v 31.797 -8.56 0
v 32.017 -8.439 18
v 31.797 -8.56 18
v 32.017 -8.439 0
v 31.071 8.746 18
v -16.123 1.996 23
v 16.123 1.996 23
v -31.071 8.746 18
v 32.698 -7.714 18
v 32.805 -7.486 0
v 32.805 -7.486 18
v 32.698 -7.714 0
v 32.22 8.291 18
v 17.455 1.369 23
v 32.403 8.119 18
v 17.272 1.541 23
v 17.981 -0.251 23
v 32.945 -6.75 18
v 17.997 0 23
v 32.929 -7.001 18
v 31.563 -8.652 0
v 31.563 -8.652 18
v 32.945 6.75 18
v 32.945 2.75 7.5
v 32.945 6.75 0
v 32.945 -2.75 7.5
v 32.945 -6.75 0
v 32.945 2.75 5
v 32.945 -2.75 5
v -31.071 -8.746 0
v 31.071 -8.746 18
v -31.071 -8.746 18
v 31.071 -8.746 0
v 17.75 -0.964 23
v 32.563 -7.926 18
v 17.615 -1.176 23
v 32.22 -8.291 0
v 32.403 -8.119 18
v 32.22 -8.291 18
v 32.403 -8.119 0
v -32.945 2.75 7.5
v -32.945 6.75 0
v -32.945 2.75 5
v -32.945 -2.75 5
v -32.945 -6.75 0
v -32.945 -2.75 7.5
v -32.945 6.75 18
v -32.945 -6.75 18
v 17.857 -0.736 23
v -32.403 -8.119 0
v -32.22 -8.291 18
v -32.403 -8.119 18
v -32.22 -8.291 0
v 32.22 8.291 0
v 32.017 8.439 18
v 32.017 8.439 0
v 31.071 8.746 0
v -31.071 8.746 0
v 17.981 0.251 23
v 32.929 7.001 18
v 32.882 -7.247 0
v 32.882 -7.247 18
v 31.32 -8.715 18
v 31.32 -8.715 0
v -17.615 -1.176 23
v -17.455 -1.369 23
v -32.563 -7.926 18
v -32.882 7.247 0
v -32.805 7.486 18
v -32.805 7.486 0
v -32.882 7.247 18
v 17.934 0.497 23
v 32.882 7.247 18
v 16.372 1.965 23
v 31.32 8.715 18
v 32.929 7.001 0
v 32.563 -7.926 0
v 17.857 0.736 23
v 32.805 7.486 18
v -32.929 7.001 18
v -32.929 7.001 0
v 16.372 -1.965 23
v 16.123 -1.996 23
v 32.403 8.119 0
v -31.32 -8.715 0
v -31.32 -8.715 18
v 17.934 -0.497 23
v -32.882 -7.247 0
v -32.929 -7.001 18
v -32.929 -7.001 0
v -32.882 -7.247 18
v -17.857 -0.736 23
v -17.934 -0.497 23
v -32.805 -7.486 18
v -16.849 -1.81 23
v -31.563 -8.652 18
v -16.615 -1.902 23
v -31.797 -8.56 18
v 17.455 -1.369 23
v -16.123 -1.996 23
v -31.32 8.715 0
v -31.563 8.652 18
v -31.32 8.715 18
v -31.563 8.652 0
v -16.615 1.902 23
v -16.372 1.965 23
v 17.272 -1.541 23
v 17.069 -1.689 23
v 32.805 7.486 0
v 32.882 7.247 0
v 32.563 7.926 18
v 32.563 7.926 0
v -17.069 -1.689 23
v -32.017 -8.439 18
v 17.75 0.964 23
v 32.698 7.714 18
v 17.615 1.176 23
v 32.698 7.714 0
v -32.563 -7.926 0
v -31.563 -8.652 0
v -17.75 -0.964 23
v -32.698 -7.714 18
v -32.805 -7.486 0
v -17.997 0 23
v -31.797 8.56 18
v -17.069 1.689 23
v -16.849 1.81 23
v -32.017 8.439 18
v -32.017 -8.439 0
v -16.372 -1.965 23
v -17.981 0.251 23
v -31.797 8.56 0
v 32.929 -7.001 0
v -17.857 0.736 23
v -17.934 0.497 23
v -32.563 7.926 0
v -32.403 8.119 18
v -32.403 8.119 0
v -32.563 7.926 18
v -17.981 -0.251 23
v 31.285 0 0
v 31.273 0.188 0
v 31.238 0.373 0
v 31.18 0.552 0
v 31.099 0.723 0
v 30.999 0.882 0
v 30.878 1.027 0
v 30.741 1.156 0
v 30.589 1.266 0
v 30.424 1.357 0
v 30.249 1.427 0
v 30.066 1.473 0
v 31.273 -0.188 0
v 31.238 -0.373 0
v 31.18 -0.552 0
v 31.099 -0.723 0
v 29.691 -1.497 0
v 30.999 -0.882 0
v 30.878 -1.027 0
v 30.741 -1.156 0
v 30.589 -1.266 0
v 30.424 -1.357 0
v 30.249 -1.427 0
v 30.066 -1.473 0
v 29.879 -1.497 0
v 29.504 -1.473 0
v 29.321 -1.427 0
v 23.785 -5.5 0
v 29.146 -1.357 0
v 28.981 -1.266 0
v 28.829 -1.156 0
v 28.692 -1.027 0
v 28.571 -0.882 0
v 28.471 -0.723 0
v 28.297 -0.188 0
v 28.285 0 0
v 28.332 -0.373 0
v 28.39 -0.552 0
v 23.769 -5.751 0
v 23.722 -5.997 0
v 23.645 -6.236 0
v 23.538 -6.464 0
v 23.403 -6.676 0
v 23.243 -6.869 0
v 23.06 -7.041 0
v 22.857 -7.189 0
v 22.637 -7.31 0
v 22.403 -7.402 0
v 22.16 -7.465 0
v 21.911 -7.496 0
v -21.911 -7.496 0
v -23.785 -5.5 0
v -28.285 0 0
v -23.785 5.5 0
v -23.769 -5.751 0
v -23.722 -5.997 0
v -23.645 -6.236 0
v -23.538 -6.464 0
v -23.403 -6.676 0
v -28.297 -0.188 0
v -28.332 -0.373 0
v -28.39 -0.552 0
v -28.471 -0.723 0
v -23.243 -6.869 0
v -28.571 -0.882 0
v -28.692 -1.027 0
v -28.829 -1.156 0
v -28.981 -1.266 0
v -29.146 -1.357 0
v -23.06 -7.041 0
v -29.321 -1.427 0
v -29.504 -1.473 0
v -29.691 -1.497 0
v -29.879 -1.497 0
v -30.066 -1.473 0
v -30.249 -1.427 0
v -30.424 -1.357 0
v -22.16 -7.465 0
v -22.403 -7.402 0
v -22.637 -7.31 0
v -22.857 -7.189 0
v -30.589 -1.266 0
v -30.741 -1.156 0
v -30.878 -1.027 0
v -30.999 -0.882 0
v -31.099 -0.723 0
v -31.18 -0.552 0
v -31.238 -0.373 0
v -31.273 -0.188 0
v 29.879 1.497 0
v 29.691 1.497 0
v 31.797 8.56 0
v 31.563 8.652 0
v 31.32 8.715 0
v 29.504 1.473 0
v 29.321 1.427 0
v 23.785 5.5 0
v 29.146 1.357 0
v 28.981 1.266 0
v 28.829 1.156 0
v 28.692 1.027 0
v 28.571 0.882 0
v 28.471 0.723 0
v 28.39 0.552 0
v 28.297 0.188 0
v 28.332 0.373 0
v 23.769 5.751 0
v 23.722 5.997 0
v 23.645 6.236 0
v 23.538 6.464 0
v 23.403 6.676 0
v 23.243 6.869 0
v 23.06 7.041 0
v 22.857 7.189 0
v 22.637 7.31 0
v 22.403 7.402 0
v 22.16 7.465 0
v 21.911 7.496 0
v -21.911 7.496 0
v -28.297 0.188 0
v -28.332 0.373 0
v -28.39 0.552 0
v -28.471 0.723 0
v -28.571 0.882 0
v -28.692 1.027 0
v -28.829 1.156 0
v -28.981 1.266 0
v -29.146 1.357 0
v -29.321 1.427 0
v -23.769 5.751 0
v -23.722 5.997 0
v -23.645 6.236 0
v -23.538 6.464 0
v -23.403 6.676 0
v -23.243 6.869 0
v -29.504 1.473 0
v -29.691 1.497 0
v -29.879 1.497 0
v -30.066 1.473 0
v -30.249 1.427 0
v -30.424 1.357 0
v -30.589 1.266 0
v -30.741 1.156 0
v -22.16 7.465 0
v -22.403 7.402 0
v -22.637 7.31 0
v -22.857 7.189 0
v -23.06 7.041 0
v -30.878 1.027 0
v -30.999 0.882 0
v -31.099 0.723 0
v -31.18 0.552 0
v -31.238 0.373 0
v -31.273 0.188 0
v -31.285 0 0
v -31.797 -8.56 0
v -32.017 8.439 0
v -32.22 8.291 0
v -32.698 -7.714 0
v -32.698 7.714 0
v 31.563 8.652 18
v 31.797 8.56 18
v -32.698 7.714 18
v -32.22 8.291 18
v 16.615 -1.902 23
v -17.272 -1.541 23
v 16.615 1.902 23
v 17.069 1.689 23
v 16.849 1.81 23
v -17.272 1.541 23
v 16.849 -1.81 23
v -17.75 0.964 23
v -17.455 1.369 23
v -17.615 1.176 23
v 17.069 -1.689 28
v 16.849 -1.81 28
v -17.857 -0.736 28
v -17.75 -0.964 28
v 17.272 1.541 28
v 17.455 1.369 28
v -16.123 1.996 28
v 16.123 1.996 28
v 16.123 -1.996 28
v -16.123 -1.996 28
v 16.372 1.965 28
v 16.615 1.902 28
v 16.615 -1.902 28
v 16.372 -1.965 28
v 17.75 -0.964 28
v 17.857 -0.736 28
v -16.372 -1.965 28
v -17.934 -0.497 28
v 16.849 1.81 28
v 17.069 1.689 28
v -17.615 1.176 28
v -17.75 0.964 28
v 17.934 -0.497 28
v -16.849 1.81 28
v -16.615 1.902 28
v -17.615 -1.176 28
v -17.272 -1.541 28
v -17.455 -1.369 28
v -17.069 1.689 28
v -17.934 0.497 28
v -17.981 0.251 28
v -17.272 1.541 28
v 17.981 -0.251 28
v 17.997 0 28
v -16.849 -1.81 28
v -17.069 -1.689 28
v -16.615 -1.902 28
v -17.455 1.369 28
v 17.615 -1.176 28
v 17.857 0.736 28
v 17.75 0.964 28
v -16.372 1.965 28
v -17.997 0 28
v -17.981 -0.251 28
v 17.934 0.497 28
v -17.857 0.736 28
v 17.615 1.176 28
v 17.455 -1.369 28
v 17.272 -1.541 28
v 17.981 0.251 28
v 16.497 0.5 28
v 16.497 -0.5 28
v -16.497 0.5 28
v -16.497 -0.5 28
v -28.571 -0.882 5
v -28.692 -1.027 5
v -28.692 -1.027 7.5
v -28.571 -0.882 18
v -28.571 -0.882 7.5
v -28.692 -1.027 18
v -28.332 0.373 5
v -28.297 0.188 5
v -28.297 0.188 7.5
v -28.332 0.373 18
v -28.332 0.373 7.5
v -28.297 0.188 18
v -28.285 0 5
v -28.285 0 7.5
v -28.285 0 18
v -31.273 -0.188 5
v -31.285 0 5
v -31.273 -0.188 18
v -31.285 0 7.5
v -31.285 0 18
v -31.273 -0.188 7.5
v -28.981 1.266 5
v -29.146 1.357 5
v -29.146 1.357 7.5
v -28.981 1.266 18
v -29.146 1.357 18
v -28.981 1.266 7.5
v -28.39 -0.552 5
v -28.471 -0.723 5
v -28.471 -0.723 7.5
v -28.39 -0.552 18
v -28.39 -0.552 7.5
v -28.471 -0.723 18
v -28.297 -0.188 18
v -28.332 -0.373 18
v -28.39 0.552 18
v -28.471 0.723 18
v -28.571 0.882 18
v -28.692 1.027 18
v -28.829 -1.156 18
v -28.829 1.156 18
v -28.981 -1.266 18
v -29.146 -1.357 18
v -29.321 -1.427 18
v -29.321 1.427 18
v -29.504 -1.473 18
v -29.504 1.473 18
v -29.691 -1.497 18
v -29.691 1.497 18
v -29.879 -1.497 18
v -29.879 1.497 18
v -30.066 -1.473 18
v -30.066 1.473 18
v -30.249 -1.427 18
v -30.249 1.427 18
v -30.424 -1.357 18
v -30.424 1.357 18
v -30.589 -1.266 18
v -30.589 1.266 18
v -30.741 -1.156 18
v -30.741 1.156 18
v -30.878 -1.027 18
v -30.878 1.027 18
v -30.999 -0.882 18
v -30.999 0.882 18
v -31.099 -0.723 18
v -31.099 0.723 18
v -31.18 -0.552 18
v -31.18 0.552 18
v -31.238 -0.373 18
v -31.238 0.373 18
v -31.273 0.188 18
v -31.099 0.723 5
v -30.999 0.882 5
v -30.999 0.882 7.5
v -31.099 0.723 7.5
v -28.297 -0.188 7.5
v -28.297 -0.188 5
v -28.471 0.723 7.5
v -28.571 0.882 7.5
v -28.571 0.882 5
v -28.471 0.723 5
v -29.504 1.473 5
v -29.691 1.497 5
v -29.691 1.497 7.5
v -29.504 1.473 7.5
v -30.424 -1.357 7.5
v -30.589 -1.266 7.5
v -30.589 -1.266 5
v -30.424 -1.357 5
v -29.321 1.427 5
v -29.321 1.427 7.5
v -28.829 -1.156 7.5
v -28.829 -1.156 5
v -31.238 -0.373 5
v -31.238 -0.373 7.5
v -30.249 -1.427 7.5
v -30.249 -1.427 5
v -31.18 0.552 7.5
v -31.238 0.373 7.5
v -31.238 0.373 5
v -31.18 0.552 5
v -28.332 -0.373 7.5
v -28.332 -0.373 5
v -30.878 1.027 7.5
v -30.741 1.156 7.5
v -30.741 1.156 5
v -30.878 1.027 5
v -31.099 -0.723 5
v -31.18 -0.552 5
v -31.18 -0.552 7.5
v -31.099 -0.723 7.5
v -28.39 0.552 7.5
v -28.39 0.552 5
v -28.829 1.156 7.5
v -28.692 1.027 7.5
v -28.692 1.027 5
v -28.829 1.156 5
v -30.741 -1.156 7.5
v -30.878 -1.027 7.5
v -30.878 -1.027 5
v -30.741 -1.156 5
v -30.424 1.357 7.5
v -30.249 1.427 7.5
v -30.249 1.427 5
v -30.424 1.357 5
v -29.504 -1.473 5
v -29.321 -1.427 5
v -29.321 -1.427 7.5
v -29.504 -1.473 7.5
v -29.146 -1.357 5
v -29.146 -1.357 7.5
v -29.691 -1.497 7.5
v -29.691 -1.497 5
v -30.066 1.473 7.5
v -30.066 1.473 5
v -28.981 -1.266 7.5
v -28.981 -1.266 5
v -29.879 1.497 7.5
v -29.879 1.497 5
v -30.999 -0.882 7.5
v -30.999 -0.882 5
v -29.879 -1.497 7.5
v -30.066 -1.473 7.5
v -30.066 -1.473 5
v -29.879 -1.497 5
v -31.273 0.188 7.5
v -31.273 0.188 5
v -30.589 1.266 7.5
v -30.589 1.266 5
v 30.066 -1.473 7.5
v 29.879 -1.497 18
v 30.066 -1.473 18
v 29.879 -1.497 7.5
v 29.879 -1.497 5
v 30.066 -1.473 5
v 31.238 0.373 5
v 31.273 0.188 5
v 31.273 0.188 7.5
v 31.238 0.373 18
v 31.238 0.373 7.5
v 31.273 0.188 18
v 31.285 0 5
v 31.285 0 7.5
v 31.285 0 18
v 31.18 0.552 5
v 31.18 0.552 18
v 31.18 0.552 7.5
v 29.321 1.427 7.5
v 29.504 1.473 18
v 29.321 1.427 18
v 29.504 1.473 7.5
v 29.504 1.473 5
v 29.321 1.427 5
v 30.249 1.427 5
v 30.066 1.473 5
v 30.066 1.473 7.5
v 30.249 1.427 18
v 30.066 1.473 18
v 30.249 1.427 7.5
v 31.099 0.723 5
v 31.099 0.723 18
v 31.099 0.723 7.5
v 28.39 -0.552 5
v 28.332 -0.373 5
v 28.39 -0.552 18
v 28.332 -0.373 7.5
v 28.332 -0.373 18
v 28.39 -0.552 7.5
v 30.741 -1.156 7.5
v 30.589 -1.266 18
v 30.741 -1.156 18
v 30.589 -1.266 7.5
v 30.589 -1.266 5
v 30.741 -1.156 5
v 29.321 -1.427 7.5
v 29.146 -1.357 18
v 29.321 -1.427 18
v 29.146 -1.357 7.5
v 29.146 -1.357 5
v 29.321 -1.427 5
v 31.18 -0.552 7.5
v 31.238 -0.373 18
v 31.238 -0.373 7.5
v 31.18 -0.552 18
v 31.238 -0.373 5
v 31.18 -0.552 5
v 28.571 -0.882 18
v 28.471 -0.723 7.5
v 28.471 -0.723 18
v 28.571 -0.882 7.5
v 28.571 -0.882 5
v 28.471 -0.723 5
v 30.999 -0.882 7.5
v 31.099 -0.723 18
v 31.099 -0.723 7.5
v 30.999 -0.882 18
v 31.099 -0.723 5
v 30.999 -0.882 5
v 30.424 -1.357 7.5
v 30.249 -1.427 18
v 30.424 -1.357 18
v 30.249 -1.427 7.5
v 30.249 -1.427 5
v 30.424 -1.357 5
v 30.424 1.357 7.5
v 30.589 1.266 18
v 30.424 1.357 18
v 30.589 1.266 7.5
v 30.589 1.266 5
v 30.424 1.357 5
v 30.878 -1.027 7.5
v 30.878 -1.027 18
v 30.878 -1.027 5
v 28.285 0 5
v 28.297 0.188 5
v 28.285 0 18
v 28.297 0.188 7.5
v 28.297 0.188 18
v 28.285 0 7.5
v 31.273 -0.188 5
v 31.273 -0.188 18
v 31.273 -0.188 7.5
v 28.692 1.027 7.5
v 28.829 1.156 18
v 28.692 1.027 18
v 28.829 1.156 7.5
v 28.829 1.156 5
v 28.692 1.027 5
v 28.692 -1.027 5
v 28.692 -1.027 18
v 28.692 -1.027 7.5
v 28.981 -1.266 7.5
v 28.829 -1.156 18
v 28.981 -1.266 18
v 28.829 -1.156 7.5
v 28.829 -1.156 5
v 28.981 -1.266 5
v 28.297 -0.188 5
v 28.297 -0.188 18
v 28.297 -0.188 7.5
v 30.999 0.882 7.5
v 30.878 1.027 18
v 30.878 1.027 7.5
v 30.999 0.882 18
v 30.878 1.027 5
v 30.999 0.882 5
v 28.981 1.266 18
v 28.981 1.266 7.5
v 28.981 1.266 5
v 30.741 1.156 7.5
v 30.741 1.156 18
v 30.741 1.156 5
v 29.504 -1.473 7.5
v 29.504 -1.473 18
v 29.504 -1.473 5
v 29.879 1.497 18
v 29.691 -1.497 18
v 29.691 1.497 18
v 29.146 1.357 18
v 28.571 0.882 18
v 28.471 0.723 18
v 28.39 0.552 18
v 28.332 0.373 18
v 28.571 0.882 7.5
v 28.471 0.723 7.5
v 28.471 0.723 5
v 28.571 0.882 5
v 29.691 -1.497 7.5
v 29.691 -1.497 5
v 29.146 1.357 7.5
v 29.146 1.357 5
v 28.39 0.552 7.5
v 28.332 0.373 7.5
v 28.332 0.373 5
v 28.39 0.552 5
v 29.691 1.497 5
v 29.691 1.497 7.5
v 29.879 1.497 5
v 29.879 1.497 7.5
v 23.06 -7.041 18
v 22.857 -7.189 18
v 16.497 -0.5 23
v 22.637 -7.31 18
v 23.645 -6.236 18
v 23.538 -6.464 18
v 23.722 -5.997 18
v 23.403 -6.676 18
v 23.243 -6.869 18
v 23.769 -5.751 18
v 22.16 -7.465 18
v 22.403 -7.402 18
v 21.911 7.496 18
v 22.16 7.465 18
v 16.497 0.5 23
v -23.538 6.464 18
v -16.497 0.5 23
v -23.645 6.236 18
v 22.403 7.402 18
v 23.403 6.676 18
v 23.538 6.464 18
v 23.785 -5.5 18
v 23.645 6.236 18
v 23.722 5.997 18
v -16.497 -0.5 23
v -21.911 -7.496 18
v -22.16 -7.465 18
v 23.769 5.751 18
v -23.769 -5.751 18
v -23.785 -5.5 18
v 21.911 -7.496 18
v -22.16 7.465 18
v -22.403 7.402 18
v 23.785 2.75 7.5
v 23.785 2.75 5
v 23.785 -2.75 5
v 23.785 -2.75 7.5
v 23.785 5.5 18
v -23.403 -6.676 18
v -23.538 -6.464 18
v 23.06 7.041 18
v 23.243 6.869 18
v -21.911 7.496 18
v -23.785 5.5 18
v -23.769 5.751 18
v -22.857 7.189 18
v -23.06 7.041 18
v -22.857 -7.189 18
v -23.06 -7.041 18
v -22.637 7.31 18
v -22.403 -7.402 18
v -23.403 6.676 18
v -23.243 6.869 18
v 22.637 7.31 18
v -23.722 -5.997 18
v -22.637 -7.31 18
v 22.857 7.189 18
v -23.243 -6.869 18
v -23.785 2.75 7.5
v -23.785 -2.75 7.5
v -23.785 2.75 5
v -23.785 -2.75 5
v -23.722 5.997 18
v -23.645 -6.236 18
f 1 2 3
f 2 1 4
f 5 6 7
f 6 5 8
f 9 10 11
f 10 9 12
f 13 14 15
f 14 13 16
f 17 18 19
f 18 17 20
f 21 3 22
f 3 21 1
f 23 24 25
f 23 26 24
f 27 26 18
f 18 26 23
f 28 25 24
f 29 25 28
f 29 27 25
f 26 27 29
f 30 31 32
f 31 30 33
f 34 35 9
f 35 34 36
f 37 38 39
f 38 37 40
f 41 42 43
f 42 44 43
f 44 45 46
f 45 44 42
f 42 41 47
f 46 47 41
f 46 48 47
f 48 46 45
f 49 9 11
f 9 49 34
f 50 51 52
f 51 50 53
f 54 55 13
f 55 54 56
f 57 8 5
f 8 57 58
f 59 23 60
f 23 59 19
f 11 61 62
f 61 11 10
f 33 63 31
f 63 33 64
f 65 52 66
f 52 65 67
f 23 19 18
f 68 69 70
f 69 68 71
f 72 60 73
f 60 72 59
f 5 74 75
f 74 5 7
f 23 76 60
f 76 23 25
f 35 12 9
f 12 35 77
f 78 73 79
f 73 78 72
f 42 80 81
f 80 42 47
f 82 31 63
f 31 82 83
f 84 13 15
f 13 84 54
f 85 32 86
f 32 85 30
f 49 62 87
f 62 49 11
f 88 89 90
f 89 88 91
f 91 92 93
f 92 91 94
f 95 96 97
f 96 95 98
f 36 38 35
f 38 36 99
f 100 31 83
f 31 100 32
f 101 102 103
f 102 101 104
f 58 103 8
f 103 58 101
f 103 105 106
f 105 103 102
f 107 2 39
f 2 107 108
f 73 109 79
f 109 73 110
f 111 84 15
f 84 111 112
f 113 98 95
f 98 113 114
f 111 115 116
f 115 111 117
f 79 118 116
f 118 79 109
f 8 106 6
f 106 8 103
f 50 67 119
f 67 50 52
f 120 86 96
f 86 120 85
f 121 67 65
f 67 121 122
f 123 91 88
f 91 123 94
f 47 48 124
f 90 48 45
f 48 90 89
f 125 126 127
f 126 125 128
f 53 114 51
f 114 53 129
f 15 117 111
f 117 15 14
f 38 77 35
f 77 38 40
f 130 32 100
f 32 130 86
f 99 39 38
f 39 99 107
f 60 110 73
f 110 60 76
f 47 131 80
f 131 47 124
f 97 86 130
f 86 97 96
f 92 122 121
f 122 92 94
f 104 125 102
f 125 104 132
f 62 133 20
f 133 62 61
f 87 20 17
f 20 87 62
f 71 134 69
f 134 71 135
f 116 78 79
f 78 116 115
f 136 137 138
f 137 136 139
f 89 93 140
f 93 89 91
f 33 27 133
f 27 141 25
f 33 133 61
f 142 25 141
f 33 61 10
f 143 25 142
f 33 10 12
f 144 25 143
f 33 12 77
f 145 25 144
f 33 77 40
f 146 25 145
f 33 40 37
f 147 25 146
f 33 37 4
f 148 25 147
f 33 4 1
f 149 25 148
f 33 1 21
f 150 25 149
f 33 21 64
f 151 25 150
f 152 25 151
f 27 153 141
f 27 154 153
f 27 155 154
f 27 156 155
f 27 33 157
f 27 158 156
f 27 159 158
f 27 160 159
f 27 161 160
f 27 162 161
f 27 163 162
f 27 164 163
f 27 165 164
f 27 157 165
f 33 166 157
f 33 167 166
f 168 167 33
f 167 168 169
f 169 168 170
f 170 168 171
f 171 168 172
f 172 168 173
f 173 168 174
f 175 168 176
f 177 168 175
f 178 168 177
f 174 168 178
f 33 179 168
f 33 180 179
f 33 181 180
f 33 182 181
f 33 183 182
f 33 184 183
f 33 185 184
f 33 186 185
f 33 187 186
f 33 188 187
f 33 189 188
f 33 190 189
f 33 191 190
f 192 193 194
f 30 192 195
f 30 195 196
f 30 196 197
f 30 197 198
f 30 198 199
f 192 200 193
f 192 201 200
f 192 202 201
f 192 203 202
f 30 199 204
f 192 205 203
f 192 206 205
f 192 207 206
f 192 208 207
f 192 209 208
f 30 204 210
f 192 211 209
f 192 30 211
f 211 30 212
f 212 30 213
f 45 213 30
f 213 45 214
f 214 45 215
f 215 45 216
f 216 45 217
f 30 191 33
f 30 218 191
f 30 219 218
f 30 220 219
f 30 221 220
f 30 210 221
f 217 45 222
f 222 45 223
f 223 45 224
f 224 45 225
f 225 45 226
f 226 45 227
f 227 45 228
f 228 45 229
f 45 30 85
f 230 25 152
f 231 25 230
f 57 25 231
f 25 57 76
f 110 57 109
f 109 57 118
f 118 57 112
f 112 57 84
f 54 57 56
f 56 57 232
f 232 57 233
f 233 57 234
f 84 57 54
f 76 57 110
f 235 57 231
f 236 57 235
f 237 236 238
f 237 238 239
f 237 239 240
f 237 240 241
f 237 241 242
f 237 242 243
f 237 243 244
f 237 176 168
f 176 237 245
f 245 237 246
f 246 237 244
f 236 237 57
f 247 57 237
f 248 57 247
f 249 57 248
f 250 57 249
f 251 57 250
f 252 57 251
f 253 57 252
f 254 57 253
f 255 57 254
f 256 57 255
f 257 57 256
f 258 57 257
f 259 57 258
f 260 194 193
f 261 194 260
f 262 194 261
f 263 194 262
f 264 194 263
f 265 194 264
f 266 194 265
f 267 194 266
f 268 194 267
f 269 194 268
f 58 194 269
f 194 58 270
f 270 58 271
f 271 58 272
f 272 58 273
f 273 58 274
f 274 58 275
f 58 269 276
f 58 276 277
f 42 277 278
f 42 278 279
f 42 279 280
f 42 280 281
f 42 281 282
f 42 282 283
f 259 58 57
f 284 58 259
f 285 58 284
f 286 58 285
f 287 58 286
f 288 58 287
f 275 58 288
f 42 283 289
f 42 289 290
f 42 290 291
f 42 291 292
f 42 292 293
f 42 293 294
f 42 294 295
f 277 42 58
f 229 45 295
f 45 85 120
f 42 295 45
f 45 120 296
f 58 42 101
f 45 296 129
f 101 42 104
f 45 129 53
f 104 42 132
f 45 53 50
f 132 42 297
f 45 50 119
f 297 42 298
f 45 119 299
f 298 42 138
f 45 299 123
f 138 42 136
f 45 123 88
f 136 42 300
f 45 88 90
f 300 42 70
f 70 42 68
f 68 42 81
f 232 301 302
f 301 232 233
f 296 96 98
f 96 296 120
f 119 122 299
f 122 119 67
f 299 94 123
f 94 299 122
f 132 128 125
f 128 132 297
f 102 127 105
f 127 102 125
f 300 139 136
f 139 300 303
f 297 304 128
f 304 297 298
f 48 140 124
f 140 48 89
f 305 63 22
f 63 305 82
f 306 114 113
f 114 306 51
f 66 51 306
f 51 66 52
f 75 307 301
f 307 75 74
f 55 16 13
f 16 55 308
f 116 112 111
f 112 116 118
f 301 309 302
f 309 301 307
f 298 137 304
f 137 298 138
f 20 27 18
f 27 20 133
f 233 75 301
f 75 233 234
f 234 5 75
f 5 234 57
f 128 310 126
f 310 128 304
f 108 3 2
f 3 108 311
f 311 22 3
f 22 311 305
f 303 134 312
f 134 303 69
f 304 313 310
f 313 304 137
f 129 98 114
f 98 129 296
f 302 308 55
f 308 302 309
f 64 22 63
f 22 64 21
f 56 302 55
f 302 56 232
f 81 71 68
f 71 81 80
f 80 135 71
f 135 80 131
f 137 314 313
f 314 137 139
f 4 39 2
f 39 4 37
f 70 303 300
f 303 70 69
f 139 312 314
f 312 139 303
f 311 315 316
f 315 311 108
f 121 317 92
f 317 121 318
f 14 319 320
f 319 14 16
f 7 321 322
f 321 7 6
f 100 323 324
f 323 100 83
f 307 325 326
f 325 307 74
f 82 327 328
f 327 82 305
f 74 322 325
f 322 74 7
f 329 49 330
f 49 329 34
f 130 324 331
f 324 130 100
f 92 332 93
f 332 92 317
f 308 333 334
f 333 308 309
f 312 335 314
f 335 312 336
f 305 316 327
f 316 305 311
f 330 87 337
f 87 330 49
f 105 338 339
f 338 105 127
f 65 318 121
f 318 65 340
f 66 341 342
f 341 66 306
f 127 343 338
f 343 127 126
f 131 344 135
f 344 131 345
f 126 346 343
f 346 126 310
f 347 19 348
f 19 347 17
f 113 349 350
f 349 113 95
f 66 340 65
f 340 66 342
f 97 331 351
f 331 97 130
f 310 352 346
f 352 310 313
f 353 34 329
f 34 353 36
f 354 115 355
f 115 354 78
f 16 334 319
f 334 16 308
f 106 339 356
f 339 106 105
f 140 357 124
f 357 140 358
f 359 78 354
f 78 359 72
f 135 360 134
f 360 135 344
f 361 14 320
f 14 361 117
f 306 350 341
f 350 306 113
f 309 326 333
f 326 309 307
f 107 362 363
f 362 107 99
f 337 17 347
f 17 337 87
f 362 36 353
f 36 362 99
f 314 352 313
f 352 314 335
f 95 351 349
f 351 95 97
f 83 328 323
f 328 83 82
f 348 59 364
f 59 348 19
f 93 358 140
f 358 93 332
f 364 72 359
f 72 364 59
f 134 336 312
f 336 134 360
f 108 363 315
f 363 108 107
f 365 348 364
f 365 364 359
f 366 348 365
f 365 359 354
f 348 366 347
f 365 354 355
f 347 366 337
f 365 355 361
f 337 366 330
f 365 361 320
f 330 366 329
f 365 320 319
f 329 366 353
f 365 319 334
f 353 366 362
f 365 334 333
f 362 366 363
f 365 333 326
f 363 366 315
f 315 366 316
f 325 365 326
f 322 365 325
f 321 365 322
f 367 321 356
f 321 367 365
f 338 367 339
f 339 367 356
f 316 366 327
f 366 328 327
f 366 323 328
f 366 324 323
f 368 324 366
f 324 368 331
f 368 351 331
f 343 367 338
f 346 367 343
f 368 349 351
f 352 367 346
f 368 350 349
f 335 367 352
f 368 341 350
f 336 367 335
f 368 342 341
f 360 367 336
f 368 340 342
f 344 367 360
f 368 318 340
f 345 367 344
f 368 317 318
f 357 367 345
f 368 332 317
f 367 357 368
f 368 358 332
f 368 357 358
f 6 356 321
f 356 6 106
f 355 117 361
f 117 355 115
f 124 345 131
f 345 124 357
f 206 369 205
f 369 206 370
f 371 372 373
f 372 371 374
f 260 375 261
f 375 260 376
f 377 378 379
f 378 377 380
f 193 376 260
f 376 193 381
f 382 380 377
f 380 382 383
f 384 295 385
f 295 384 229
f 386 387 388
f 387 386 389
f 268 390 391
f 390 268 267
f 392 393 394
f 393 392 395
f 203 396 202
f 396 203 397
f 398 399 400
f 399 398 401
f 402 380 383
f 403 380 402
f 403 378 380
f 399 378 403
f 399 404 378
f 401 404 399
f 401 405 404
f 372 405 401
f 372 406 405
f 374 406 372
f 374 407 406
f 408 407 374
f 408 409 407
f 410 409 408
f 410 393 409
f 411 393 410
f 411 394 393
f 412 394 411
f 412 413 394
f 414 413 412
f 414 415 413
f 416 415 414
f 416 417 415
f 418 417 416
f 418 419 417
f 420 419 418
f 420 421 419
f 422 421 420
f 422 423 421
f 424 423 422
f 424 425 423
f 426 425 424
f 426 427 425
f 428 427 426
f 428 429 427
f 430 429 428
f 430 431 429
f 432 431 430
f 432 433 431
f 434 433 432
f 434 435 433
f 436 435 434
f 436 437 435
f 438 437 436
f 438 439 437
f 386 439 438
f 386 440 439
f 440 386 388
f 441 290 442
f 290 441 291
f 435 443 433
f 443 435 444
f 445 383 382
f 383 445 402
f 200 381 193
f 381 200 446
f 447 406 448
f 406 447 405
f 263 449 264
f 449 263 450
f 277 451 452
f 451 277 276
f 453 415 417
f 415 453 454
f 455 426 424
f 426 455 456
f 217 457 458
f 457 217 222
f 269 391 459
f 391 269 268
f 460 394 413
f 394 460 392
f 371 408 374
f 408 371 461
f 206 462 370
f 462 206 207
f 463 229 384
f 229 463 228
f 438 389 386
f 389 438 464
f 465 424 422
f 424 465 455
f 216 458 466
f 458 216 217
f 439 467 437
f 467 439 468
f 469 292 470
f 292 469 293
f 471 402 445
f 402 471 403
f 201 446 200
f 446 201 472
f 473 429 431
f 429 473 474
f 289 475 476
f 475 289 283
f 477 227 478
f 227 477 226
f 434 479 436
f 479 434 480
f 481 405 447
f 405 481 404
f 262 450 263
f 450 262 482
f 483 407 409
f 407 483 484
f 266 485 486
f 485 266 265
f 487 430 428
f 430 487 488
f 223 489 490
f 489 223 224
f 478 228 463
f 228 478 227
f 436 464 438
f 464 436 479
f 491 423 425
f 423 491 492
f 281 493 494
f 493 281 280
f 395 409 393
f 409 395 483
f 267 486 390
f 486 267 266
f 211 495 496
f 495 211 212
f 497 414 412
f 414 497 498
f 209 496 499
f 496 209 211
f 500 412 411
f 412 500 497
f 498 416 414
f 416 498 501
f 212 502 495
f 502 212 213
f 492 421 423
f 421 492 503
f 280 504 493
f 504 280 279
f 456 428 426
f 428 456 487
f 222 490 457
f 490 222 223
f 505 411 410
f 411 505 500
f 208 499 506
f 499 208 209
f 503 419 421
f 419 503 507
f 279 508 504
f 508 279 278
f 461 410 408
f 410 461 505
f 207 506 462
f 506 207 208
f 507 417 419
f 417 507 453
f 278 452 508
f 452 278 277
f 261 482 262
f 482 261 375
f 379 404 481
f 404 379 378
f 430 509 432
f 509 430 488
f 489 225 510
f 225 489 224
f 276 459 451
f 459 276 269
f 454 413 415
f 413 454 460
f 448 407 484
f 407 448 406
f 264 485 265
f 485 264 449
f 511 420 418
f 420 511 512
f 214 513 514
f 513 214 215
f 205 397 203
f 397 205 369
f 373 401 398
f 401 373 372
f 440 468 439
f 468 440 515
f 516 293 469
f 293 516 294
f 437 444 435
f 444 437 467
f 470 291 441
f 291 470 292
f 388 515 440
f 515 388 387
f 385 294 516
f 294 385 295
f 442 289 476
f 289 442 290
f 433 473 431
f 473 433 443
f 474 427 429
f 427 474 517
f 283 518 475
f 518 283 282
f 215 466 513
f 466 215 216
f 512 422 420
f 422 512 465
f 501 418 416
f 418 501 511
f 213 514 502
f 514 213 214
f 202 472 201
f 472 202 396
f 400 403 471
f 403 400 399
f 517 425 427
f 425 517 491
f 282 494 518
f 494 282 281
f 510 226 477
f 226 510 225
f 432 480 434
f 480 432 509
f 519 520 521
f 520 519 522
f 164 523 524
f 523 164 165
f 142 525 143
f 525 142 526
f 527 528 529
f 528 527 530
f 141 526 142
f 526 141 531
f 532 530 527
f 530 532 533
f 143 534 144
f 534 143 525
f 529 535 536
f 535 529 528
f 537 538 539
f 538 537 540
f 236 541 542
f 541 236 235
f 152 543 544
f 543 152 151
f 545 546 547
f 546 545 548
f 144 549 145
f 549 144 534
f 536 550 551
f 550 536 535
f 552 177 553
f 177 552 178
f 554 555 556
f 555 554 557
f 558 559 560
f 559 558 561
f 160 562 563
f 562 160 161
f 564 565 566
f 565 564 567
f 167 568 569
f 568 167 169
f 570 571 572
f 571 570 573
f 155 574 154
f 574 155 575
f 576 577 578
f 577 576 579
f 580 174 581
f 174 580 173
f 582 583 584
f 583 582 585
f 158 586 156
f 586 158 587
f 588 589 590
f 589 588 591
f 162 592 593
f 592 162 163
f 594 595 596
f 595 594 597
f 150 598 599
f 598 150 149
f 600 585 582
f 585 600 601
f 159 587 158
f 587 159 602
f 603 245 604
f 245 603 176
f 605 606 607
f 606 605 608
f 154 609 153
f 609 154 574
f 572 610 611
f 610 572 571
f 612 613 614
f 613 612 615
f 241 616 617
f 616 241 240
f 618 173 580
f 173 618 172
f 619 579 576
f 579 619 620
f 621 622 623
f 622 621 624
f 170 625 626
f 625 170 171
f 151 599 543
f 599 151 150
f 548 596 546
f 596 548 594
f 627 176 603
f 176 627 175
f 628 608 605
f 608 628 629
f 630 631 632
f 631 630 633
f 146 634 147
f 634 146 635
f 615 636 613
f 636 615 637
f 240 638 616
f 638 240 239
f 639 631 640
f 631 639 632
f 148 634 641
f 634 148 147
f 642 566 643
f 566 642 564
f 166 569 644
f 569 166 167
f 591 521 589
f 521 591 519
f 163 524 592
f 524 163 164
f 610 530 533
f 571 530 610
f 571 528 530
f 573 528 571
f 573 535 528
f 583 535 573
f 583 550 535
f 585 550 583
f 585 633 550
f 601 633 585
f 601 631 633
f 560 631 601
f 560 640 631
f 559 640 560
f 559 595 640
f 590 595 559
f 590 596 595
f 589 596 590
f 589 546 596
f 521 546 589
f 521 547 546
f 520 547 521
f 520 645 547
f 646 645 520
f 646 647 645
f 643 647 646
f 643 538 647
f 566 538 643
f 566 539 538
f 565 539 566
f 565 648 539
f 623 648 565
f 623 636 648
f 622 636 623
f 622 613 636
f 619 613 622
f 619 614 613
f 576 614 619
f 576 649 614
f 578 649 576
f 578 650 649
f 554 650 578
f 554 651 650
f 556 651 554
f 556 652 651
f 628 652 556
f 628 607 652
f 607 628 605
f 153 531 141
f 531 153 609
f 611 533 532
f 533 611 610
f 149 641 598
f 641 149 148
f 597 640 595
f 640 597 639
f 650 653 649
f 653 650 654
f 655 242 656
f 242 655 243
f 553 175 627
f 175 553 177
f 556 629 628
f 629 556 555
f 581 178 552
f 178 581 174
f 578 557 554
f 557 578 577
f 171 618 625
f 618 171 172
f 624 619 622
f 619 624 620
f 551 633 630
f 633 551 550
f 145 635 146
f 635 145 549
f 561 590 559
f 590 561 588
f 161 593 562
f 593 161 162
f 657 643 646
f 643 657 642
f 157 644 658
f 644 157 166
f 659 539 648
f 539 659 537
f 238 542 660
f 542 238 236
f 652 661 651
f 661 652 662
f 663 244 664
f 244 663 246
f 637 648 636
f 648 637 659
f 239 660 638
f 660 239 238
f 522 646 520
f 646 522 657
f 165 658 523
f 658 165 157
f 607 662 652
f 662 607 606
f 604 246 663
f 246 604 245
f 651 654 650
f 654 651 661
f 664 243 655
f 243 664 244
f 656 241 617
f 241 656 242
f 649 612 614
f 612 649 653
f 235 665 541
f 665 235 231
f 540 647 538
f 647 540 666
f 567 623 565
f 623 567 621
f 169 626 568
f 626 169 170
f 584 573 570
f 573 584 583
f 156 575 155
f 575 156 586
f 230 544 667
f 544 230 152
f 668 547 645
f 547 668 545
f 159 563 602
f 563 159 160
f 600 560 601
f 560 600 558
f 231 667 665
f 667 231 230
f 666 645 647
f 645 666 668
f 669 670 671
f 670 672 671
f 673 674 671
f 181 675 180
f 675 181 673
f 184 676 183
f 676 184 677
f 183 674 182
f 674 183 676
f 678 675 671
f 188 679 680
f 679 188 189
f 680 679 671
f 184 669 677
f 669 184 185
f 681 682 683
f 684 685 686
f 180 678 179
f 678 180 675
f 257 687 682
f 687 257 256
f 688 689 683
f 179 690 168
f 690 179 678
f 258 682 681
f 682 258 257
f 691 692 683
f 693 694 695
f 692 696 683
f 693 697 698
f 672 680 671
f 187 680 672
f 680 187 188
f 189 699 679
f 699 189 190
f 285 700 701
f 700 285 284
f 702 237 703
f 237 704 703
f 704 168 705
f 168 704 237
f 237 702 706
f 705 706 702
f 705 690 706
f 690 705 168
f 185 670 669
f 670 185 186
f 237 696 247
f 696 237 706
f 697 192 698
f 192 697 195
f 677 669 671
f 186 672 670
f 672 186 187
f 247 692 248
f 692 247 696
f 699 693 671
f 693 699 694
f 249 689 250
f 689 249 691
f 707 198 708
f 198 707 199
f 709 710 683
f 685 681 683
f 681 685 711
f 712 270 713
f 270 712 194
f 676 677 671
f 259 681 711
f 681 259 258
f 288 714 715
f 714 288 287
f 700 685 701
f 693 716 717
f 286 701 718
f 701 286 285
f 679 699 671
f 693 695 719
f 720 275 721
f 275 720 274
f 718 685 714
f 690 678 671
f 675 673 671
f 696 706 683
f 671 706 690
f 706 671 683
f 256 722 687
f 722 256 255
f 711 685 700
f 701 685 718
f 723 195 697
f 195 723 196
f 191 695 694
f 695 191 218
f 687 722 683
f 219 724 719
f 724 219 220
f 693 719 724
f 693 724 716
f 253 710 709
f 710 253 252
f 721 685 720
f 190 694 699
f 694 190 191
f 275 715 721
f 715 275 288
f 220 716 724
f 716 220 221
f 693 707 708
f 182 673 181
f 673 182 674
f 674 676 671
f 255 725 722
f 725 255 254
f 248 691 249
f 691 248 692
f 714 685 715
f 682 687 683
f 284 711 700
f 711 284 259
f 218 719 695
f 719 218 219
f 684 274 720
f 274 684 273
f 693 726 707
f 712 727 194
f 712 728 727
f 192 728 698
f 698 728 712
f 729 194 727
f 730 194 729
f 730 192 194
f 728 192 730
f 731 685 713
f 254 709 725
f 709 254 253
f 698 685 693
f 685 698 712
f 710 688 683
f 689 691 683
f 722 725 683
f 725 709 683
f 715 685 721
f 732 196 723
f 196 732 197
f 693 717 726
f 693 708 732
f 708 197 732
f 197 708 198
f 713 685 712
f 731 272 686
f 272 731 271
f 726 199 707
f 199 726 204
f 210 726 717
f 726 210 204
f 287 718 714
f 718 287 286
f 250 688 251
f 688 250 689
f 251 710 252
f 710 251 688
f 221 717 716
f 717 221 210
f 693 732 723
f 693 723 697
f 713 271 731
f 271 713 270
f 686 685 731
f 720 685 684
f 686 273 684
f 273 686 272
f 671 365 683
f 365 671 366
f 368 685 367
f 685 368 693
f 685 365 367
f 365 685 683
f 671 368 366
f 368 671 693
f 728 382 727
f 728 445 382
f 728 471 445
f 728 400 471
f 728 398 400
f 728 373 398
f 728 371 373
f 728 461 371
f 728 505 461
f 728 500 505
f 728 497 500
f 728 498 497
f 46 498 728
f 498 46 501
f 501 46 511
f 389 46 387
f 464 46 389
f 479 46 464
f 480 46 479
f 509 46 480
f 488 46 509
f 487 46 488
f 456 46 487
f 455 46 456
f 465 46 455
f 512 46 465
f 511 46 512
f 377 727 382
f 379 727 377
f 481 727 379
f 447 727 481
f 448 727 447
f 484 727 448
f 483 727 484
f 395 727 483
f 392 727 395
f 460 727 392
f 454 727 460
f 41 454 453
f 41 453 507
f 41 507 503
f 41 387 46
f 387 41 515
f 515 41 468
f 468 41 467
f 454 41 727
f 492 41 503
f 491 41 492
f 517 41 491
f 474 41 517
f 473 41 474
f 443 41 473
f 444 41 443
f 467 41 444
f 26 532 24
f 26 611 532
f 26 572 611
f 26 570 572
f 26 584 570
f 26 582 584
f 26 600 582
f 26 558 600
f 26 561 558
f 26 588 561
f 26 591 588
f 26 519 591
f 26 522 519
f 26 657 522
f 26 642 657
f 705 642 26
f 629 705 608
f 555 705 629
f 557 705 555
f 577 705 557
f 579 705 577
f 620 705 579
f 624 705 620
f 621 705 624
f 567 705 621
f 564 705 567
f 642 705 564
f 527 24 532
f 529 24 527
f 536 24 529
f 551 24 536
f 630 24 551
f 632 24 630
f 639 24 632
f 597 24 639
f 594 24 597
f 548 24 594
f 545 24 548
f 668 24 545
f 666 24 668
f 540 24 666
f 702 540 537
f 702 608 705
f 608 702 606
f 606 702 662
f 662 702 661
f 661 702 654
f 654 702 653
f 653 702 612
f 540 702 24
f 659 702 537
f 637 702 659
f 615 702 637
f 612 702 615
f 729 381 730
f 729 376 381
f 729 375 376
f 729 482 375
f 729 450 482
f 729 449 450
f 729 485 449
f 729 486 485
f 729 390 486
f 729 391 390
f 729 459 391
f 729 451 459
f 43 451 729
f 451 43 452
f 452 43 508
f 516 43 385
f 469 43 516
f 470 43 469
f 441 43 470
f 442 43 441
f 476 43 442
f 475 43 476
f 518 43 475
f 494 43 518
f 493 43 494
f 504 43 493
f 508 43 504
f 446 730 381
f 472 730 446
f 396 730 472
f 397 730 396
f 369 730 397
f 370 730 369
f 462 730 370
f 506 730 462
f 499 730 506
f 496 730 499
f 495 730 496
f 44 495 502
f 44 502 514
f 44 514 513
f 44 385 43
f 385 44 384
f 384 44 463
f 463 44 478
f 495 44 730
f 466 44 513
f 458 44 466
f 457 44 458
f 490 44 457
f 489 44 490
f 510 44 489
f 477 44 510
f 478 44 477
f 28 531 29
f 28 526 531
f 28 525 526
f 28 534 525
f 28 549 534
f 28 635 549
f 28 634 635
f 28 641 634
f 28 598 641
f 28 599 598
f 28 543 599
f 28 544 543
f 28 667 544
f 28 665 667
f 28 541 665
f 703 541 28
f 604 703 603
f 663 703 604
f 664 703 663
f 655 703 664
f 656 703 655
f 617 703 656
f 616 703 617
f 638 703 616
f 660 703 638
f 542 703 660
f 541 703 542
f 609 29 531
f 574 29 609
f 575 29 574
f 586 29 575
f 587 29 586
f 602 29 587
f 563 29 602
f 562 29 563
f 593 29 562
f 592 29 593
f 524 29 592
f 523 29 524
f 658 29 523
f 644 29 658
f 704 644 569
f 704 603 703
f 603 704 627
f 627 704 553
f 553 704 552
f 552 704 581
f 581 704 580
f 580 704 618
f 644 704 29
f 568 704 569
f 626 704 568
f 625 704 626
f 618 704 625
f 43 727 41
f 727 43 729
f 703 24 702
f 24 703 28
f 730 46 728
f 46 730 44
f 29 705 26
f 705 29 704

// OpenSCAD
// file: lib/chassis-connector-housing.scad
// Chassis Connector Housing
// By Hans Christian Saustrup <hc@saustrup.net>
model_version = "v0.0.1";

ds = 3.0;
t = 1.5;

module flat_rounded_cube(size, d=4) {
    _size = [
        size.x - d,
        size.y - d,
        size.z
    ];

    translate([d/2, d/2])
    hull()
    for (x=[0, 1])
    for (y=[0, 1])
    translate([
        x * _size.x,
        y * _size.y,
        0
    ])
    cylinder(d=d, h=_size.z);
}

module _cube(size, d=4) {
    flat_rounded_cube(size, d);
    // cube(size);
}

module __generic_chassis_connector_housing(cutout, screw_distance, wires) {

    echo(["Cutout:", cutout]);
    echo(["Screw distance:", screw_distance]);

    // Flat cable - leave room for one extra wire
    cable_pitch = 1.269;
    cable_hole = [wires * cable_pitch, 1, 5];

    house1 = [
        screw_distance + 6.32,
        cutout.y + 1 + t,
        18
    ];

    house1_cutout = [
        cutout.x,
        cutout.y,
        house1.z
    ];

    house2 = [
        cable_hole.x + (2*t),
        cable_hole.y + (2*t),
        cable_hole.z
    ];
    house2_cutout = cable_hole;

    screw_cutout = [
        house1.x,
        5.5, // Nut width
        2.5 // Nut height
    ];

    difference() {
        union() {
            hull() {
                translate([-house1.x/2, -house1.y/2])
                _cube(house1, d=4);
                translate([-house2.x/2, -house2.y/2, house1.z])
                _cube(house2);
            }
            translate([-house2.x/2, -house2.y/2, house1.z + house2.z])
            _cube(house2);
        }
        union() {
            hull() {
                translate([-house1_cutout.x/2, -house1_cutout.y/2])
                _cube(house1_cutout);
                translate([-house2_cutout.x/2, -house2_cutout.y/2, house1.z])
                cube(house2_cutout);
            }
            translate([-house2_cutout.x/2, -house2_cutout.y/2, house1.z + house2.z])
            cube(house2_cutout);

            translate([-screw_cutout.x/2, -screw_cutout.y/2, screw_cutout.z * 2])
            cube(screw_cutout);

            for (x=[-0.5,0.5])
            translate([screw_distance*x, 0])
            cylinder(r=ds/2, h=house1.z);
        }
    }

}

module chassis_connector_housing_db(pins, wires=0) {
    // Row with most pins:
    maxpins = pins - floor(pins/2);

    pin_pitch = 2.775;
    pin_width = 1.7;
    pin_to_pin = (maxpins-1) * pin_pitch + pin_width;

    inside = [
        pin_to_pin + 7,
        11.5,
        5
    ];

    screw_distance = inside.x + 4.68;
    __generic_chassis_connector_housing(inside, screw_distance, wires != 0 ? wires : pins + 1);
}

module chassis_connector_housing_centronics(pins, wires=0) {
    pin_columns = pins / 2;

    pin_pitch = 2.11;
    pin_width = 1.20;
    pin_to_pin = (pin_columns - 1) * pin_pitch + pin_width;

    __generic_chassis_connector_housing(
        [
            pin_to_pin + 10.5,
            15,
            3.5
        ],
        pin_to_pin + 22.5,
        wires
    );
}
// main file
use <lib/chassis-connector-housing.scad>;

$fn = $preview ? 0 : 50;

chassis_connector_housing_centronics(36, 26);
